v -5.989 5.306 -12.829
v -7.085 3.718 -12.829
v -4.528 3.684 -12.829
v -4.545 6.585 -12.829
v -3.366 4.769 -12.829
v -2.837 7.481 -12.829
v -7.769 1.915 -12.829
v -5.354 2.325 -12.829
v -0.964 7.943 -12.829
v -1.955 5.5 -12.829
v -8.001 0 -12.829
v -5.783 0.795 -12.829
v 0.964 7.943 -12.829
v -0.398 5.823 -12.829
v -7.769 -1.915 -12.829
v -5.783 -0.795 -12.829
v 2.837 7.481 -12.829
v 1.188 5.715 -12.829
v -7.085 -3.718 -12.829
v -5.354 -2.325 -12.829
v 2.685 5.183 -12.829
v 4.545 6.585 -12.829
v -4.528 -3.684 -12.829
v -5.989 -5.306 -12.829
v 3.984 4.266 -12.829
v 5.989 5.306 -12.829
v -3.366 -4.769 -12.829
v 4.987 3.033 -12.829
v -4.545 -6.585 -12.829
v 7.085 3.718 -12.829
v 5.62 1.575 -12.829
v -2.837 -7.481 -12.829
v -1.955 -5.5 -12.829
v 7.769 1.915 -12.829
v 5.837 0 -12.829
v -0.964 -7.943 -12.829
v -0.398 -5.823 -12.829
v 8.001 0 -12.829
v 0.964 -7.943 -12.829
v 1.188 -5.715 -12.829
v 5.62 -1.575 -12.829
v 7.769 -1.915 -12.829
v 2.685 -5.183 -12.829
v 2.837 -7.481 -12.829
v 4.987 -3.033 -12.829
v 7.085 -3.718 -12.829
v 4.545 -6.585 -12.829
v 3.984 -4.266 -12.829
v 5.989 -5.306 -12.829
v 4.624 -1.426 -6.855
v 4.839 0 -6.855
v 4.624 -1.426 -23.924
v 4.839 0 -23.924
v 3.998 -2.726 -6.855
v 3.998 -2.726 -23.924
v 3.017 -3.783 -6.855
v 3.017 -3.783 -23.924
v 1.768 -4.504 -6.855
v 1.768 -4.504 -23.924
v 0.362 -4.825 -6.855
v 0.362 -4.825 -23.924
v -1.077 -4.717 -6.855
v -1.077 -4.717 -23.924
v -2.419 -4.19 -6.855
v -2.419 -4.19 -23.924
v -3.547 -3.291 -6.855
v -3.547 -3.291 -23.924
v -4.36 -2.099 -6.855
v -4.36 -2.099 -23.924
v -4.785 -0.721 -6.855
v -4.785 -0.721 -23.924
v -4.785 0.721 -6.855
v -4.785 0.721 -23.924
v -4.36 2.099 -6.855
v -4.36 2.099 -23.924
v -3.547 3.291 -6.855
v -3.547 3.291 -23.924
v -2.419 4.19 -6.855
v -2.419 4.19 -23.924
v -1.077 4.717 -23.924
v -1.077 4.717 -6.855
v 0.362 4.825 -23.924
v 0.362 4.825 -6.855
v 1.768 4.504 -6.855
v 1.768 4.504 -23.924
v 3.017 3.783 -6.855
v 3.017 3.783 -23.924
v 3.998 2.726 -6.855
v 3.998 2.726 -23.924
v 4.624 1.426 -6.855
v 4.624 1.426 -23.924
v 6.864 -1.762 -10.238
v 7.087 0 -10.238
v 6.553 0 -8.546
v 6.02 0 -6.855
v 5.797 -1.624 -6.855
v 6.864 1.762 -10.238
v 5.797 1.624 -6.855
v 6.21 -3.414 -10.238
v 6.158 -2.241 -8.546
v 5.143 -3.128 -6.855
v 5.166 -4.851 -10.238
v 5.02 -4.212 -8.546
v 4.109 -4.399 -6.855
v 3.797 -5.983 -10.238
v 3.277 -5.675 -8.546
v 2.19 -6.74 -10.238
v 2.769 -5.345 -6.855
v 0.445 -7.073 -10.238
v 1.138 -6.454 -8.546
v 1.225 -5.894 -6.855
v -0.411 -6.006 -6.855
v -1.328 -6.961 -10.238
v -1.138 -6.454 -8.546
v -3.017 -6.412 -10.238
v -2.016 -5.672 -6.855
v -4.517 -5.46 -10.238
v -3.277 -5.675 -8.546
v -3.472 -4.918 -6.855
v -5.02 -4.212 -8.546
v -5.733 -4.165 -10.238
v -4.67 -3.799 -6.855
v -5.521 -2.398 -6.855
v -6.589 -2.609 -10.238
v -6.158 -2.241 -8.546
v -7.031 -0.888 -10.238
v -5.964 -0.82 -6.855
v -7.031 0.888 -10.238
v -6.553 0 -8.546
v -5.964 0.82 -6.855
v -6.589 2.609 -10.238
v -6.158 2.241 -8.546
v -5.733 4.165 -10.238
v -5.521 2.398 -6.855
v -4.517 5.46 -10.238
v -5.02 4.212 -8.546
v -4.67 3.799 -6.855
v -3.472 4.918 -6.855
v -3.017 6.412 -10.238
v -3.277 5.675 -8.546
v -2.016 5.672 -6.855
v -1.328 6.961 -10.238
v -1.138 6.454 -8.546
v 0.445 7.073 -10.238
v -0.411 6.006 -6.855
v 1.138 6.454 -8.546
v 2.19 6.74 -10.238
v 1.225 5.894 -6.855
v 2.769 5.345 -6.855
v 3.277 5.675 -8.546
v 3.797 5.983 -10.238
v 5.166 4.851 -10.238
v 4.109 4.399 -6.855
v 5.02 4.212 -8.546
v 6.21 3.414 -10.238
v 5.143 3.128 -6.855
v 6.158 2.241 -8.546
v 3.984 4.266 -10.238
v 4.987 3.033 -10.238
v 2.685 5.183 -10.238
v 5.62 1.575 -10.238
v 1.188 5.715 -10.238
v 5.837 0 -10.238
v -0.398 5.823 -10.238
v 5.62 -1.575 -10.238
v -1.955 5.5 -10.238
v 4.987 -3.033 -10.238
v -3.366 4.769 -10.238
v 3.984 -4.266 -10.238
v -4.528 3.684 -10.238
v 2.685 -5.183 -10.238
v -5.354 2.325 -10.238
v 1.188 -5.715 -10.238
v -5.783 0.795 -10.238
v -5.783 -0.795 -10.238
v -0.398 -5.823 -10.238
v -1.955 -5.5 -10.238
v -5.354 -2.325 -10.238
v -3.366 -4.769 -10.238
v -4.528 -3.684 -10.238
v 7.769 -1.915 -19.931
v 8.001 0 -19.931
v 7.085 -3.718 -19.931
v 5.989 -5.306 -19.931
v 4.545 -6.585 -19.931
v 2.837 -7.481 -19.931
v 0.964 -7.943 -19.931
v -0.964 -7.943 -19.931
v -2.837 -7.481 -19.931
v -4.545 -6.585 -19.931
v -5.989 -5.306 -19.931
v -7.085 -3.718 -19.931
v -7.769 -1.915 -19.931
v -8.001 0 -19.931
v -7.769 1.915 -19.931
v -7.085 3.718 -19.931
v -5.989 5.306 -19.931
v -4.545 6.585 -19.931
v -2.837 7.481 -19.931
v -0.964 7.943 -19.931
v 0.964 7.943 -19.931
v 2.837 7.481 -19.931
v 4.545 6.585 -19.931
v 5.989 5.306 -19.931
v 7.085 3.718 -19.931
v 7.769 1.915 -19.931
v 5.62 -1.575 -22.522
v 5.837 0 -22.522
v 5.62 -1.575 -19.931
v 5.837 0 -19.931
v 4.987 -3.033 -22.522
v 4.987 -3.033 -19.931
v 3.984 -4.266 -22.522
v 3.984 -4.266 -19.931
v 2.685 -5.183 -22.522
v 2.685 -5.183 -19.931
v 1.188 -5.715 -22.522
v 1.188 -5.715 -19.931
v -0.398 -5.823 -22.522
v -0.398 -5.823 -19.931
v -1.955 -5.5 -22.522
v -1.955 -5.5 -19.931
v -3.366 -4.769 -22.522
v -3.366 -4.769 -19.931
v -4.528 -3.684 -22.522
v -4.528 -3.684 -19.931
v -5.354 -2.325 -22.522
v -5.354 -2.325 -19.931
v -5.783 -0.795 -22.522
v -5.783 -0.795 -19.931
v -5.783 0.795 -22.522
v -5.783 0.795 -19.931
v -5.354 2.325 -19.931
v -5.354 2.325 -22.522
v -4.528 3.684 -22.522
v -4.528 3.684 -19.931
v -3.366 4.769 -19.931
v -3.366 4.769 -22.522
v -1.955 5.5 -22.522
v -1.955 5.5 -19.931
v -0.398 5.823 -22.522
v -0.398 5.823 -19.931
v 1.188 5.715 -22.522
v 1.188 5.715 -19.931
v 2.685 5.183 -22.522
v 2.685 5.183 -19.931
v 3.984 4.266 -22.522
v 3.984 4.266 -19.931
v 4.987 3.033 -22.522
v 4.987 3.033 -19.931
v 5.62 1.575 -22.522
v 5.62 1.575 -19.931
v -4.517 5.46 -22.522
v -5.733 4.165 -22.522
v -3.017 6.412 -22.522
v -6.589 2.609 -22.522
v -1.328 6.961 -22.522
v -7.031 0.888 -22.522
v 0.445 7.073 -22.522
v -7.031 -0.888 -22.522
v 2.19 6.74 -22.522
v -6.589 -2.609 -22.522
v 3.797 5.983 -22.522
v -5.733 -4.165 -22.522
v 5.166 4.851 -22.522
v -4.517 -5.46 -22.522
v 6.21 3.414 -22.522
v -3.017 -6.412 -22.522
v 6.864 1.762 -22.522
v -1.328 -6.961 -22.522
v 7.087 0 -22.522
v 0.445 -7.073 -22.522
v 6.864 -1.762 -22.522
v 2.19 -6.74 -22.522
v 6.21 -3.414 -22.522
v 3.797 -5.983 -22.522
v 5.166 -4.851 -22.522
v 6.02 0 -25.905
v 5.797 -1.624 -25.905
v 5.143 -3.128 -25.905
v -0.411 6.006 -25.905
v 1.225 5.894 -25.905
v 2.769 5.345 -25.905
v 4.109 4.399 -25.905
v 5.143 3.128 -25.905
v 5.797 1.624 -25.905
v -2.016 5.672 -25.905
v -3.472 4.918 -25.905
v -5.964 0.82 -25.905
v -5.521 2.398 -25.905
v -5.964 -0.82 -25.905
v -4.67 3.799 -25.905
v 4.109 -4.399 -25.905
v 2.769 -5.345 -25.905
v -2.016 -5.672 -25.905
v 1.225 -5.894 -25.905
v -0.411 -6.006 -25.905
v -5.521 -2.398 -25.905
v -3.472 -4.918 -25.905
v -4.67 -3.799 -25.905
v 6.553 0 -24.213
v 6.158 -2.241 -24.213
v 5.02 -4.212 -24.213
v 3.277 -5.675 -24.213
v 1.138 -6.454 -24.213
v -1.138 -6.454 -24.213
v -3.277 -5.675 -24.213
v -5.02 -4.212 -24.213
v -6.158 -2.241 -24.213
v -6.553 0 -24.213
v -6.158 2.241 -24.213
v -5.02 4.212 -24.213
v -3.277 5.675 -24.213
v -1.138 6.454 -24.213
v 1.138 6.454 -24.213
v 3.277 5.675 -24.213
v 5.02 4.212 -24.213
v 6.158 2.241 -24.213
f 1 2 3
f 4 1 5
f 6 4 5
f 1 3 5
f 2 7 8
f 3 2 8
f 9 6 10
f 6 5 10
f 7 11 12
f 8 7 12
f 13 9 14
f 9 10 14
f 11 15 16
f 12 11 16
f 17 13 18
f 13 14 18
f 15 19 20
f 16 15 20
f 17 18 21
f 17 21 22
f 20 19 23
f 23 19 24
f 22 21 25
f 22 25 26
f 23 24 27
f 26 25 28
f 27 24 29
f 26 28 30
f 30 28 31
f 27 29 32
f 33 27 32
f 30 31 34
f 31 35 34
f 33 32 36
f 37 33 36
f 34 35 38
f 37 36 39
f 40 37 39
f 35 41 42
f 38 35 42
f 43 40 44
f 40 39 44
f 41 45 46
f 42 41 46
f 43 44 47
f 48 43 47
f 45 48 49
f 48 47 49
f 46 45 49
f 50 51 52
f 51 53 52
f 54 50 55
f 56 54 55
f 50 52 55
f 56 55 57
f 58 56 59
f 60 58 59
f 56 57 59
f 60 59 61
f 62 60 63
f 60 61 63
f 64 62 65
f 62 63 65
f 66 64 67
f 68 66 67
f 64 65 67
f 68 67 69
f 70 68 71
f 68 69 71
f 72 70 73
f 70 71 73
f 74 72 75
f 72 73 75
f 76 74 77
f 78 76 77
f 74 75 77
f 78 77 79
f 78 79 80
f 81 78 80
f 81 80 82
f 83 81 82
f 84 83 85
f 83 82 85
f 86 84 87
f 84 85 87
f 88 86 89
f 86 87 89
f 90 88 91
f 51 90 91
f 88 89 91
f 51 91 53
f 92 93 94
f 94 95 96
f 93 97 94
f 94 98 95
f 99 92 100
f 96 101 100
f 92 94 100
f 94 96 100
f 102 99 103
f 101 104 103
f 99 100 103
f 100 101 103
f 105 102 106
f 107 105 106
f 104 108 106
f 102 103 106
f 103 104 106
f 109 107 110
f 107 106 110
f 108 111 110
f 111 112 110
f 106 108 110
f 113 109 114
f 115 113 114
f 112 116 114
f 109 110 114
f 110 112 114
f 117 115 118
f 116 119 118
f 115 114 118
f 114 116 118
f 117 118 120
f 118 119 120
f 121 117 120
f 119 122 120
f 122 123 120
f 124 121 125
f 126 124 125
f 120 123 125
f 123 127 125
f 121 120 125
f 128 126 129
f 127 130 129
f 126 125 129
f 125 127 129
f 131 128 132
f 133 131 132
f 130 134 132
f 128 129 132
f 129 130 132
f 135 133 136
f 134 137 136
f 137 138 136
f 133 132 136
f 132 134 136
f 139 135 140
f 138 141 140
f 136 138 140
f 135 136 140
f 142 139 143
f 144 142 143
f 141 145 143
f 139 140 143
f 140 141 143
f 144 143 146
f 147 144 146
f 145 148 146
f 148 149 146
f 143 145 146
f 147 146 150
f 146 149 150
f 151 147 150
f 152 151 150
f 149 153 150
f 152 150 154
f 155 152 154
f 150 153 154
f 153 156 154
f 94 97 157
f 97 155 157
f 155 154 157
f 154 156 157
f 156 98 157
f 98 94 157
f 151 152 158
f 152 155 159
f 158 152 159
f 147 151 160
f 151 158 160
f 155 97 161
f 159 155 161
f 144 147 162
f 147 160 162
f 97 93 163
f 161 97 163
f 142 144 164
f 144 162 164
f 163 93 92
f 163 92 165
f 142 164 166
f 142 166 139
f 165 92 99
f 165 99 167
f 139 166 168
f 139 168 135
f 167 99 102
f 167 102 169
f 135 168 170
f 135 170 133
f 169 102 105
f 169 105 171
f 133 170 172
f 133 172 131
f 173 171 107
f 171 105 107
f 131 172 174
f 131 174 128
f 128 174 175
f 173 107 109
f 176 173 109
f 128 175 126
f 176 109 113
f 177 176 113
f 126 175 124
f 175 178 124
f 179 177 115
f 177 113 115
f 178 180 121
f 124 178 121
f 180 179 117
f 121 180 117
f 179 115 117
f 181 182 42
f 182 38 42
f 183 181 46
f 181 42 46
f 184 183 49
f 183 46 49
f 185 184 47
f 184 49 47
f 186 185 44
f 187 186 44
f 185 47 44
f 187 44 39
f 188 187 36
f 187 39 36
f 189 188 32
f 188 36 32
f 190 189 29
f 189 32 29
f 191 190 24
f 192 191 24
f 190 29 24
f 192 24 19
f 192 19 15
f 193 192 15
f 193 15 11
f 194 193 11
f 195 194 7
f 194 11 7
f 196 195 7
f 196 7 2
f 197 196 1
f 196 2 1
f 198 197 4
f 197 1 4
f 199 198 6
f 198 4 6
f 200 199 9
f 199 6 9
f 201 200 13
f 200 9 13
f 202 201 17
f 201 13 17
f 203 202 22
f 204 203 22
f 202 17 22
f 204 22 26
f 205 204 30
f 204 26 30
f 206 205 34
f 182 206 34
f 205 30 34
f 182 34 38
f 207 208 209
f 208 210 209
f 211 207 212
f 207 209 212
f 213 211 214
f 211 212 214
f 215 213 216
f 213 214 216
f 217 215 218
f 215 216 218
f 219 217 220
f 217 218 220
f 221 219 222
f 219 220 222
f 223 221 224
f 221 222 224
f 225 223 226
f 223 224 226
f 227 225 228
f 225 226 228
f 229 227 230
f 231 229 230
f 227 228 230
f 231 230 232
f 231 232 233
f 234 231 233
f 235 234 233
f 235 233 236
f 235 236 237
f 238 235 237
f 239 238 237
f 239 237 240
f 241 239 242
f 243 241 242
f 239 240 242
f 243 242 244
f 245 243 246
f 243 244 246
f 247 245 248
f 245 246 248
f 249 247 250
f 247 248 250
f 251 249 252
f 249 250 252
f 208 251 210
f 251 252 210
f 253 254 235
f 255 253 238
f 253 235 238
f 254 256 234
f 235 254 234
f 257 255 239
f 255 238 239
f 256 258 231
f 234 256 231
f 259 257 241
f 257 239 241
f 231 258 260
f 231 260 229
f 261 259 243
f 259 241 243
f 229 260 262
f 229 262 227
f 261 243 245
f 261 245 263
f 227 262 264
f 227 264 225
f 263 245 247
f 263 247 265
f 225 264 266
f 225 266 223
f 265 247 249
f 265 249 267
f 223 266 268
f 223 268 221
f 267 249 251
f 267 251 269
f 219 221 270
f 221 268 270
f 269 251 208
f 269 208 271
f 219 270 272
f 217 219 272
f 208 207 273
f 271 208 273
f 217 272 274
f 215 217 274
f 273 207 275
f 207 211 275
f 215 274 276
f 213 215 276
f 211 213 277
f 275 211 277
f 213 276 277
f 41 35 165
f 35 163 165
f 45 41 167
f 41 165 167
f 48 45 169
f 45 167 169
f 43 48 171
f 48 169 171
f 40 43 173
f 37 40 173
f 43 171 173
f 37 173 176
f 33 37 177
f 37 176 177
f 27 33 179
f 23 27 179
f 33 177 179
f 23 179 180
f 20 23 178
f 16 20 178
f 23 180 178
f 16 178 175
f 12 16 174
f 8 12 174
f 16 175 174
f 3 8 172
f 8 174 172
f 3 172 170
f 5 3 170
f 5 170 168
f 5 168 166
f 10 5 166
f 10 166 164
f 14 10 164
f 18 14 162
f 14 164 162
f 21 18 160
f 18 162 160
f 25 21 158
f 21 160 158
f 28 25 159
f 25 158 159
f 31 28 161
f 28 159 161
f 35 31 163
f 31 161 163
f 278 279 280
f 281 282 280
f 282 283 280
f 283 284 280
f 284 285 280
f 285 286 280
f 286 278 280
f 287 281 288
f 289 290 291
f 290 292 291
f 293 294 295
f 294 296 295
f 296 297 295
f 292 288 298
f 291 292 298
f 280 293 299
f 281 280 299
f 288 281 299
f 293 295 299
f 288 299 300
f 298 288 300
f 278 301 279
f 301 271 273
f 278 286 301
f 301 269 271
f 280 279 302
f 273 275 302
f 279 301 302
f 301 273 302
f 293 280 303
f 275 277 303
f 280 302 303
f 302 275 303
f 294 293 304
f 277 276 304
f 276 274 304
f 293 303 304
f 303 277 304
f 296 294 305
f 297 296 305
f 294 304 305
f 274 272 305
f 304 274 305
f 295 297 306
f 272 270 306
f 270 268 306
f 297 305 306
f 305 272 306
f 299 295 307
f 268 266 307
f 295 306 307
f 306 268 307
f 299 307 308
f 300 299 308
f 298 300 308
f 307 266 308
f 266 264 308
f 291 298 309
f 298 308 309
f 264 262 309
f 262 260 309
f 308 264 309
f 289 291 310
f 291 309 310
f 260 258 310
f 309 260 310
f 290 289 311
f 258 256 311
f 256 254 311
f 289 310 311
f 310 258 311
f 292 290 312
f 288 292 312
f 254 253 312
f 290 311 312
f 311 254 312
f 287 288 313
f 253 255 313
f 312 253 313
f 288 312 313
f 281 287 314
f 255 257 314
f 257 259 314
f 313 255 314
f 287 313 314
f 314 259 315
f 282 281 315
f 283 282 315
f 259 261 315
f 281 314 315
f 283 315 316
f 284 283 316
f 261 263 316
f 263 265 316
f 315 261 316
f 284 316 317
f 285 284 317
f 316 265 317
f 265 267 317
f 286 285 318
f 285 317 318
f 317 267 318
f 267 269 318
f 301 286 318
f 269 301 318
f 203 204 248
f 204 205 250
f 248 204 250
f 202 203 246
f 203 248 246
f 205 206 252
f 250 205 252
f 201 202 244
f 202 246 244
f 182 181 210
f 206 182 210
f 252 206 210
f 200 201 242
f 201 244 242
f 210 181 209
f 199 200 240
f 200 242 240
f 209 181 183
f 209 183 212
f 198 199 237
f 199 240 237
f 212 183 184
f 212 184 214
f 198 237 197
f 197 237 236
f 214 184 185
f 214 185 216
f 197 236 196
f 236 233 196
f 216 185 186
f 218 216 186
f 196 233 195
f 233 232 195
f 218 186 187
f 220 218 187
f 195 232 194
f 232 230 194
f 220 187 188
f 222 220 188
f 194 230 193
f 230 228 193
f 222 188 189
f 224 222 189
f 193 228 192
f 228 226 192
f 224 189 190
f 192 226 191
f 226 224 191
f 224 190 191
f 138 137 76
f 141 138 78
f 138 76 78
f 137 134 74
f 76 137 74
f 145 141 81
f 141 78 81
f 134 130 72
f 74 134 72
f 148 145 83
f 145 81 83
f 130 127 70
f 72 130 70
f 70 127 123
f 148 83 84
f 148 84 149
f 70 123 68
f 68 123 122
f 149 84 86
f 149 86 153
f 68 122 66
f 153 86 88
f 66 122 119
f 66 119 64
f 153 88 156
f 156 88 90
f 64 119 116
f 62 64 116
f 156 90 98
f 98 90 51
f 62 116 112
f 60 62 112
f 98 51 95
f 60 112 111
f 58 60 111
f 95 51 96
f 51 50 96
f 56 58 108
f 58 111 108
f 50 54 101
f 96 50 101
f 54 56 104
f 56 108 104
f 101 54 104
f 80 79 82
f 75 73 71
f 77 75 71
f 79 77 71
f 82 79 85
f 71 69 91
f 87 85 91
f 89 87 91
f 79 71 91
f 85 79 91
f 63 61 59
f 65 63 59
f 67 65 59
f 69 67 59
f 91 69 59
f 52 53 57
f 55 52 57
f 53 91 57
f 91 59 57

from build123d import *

# Parameters (mm, degrees)
SCALE1_SCALE = 0.6


with BuildPart() as part:
    # Sketch1 → Revolve1 (revolve)
    with BuildSketch(Plane(origin=(0, 0, 0), x_dir=(0, 0, -1), z_dir=(1, 0, 0)), mode=Mode.PRIVATE) as revolve1_sk:
        Polygon((0, -8.0645), (28.448, -8.0645), (28.448, 0), (31.75, 0), (31.75, -10.033), (26.1112, -11.811), (26.1112, -9.7282), (21.7932, -9.7282), (21.7932, -13.335), (9.9568, -13.335), (9.9568, -9.7282), (5.6388, -9.7282), (5.6388, -11.811), (0, -10.033), align=None)
    revolve(revolve1_sk.sketch.rotate(Axis((0, 0, 0), (0, 0, -1)), 270), axis=Axis((0, 0, 0), (0, 0, -1)))


with BuildPart() as part_1:
    # Scale1: scaled about (0, 0, -17.137127413)
    add(part.part.scale(SCALE1_SCALE).moved(Location((0, 0, -6.854850965))))


solid = part_1.part
